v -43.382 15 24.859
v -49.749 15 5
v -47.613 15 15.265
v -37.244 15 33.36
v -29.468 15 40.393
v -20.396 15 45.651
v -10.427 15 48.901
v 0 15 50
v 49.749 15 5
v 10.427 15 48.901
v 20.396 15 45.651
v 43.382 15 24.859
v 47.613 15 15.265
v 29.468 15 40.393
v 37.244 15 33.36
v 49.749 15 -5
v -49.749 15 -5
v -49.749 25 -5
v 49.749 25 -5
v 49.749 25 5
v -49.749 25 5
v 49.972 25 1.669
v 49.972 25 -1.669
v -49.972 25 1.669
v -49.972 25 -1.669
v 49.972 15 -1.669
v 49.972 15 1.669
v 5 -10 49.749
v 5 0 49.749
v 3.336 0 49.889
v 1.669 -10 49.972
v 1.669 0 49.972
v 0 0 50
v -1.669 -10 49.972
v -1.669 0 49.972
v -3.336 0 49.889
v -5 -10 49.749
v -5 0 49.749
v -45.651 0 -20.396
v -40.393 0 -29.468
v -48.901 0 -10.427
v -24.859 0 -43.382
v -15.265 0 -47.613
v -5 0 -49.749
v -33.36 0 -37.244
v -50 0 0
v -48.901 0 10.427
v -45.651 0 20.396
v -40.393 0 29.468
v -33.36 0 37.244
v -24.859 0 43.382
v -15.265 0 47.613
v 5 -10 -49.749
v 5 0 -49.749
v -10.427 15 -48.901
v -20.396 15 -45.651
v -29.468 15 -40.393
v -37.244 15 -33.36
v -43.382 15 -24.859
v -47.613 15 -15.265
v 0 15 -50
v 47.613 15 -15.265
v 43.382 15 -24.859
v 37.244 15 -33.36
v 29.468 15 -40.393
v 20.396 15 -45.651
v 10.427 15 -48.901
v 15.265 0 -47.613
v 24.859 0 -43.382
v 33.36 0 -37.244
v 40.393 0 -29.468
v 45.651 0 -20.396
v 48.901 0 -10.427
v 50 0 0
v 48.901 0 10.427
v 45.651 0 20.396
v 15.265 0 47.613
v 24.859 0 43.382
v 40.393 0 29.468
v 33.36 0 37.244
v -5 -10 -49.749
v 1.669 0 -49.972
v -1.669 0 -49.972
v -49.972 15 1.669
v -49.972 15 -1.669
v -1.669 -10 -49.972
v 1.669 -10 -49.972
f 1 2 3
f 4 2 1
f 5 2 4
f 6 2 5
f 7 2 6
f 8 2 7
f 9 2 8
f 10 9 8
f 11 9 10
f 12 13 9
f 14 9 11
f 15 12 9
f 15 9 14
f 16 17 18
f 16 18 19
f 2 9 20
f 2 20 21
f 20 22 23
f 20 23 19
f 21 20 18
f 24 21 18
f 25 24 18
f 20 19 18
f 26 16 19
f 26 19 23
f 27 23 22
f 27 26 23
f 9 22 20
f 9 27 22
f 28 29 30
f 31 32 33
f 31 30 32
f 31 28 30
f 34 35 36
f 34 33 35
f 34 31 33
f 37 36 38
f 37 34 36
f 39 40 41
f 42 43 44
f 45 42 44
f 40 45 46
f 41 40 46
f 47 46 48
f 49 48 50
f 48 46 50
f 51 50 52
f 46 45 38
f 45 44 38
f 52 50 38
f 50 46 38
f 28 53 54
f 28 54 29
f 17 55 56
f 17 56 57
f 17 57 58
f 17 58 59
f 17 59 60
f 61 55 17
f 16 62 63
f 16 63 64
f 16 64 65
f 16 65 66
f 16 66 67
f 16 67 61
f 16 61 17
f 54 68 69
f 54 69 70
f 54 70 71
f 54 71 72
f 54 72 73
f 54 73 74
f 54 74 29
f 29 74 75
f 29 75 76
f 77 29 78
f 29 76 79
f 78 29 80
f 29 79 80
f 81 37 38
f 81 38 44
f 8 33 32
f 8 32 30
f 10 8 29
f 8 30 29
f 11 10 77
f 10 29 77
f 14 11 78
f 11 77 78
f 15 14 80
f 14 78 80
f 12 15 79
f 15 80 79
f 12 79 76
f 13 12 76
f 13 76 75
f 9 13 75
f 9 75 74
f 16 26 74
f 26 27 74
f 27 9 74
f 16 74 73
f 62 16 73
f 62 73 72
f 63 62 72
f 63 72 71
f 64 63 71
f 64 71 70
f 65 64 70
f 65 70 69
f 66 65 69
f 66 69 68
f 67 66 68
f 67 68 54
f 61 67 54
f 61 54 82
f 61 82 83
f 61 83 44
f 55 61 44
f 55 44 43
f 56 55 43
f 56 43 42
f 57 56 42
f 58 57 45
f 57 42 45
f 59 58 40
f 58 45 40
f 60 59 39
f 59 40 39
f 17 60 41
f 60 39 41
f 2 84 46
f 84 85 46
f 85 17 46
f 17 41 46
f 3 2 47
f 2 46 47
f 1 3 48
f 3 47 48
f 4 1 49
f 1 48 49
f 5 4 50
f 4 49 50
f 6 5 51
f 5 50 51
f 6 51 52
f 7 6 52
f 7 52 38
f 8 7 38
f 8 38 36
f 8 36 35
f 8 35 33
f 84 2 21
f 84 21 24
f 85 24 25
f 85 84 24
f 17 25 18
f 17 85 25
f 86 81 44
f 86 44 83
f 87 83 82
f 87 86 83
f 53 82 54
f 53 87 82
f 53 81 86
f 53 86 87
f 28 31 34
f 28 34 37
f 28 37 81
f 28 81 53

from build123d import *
from build123d.topology import SkipClean

# Parameters (mm, degrees)
SKETCH1_R           = 50
BOSS_EXTRUDE1_DEPTH = 15
BOSS_EXTRUDE2_DEPTH = 10
BOSS_EXTRUDE3_START = 10
BOSS_EXTRUDE3_DEPTH = 10


with BuildPart() as part:
    # Sketch1 → Boss-Extrude1 (new body)
    with BuildSketch(Plane(origin=(0, 0, 0), x_dir=(1, 0, 0), z_dir=(0, 1, 0))):
        with Locations(Location((0, 0, 0), (0, 0, 270))):
            Circle(SKETCH1_R)
    extrude(amount=BOSS_EXTRUDE1_DEPTH)

    # Sketch2 → Boss-Extrude2 (add)
    with SkipClean():  # the faces are left unmerged after this step: merging them gives an invalid solid
        with BuildSketch(Plane(origin=(0, 15, 0), x_dir=(1, 0, 0), z_dir=(0, 1, 0))):
            with BuildLine():
                Line((-49.749371855, 5), (49.749371855, 5))
                ThreePointArc((49.749371855, 5), (50, 0), (49.749371855, -5))
                Line((49.749371855, -5), (-49.749371855, -5))
                ThreePointArc((-49.749371855, -5), (-50, 0), (-49.749371855, 5))
            make_face()
        extrude(amount=BOSS_EXTRUDE2_DEPTH)

    # Sketch3 → Boss-Extrude3 (add)
    with SkipClean():  # the faces are left unmerged after this step: merging them gives an invalid solid
        with BuildSketch(Plane.XZ.offset(BOSS_EXTRUDE3_START)):
            with BuildLine():
                ThreePointArc((-5, -49.749371855), (0, -50), (5, -49.749371855))
                Line((5, -49.749371855), (5, 49.749371855))
                ThreePointArc((5, 49.749371855), (0, 50), (-5, 49.749371855))
                Line((-5, 49.749371855), (-5, -49.749371855))
            make_face()
        extrude(amount=-BOSS_EXTRUDE3_DEPTH)


solid = part.part
